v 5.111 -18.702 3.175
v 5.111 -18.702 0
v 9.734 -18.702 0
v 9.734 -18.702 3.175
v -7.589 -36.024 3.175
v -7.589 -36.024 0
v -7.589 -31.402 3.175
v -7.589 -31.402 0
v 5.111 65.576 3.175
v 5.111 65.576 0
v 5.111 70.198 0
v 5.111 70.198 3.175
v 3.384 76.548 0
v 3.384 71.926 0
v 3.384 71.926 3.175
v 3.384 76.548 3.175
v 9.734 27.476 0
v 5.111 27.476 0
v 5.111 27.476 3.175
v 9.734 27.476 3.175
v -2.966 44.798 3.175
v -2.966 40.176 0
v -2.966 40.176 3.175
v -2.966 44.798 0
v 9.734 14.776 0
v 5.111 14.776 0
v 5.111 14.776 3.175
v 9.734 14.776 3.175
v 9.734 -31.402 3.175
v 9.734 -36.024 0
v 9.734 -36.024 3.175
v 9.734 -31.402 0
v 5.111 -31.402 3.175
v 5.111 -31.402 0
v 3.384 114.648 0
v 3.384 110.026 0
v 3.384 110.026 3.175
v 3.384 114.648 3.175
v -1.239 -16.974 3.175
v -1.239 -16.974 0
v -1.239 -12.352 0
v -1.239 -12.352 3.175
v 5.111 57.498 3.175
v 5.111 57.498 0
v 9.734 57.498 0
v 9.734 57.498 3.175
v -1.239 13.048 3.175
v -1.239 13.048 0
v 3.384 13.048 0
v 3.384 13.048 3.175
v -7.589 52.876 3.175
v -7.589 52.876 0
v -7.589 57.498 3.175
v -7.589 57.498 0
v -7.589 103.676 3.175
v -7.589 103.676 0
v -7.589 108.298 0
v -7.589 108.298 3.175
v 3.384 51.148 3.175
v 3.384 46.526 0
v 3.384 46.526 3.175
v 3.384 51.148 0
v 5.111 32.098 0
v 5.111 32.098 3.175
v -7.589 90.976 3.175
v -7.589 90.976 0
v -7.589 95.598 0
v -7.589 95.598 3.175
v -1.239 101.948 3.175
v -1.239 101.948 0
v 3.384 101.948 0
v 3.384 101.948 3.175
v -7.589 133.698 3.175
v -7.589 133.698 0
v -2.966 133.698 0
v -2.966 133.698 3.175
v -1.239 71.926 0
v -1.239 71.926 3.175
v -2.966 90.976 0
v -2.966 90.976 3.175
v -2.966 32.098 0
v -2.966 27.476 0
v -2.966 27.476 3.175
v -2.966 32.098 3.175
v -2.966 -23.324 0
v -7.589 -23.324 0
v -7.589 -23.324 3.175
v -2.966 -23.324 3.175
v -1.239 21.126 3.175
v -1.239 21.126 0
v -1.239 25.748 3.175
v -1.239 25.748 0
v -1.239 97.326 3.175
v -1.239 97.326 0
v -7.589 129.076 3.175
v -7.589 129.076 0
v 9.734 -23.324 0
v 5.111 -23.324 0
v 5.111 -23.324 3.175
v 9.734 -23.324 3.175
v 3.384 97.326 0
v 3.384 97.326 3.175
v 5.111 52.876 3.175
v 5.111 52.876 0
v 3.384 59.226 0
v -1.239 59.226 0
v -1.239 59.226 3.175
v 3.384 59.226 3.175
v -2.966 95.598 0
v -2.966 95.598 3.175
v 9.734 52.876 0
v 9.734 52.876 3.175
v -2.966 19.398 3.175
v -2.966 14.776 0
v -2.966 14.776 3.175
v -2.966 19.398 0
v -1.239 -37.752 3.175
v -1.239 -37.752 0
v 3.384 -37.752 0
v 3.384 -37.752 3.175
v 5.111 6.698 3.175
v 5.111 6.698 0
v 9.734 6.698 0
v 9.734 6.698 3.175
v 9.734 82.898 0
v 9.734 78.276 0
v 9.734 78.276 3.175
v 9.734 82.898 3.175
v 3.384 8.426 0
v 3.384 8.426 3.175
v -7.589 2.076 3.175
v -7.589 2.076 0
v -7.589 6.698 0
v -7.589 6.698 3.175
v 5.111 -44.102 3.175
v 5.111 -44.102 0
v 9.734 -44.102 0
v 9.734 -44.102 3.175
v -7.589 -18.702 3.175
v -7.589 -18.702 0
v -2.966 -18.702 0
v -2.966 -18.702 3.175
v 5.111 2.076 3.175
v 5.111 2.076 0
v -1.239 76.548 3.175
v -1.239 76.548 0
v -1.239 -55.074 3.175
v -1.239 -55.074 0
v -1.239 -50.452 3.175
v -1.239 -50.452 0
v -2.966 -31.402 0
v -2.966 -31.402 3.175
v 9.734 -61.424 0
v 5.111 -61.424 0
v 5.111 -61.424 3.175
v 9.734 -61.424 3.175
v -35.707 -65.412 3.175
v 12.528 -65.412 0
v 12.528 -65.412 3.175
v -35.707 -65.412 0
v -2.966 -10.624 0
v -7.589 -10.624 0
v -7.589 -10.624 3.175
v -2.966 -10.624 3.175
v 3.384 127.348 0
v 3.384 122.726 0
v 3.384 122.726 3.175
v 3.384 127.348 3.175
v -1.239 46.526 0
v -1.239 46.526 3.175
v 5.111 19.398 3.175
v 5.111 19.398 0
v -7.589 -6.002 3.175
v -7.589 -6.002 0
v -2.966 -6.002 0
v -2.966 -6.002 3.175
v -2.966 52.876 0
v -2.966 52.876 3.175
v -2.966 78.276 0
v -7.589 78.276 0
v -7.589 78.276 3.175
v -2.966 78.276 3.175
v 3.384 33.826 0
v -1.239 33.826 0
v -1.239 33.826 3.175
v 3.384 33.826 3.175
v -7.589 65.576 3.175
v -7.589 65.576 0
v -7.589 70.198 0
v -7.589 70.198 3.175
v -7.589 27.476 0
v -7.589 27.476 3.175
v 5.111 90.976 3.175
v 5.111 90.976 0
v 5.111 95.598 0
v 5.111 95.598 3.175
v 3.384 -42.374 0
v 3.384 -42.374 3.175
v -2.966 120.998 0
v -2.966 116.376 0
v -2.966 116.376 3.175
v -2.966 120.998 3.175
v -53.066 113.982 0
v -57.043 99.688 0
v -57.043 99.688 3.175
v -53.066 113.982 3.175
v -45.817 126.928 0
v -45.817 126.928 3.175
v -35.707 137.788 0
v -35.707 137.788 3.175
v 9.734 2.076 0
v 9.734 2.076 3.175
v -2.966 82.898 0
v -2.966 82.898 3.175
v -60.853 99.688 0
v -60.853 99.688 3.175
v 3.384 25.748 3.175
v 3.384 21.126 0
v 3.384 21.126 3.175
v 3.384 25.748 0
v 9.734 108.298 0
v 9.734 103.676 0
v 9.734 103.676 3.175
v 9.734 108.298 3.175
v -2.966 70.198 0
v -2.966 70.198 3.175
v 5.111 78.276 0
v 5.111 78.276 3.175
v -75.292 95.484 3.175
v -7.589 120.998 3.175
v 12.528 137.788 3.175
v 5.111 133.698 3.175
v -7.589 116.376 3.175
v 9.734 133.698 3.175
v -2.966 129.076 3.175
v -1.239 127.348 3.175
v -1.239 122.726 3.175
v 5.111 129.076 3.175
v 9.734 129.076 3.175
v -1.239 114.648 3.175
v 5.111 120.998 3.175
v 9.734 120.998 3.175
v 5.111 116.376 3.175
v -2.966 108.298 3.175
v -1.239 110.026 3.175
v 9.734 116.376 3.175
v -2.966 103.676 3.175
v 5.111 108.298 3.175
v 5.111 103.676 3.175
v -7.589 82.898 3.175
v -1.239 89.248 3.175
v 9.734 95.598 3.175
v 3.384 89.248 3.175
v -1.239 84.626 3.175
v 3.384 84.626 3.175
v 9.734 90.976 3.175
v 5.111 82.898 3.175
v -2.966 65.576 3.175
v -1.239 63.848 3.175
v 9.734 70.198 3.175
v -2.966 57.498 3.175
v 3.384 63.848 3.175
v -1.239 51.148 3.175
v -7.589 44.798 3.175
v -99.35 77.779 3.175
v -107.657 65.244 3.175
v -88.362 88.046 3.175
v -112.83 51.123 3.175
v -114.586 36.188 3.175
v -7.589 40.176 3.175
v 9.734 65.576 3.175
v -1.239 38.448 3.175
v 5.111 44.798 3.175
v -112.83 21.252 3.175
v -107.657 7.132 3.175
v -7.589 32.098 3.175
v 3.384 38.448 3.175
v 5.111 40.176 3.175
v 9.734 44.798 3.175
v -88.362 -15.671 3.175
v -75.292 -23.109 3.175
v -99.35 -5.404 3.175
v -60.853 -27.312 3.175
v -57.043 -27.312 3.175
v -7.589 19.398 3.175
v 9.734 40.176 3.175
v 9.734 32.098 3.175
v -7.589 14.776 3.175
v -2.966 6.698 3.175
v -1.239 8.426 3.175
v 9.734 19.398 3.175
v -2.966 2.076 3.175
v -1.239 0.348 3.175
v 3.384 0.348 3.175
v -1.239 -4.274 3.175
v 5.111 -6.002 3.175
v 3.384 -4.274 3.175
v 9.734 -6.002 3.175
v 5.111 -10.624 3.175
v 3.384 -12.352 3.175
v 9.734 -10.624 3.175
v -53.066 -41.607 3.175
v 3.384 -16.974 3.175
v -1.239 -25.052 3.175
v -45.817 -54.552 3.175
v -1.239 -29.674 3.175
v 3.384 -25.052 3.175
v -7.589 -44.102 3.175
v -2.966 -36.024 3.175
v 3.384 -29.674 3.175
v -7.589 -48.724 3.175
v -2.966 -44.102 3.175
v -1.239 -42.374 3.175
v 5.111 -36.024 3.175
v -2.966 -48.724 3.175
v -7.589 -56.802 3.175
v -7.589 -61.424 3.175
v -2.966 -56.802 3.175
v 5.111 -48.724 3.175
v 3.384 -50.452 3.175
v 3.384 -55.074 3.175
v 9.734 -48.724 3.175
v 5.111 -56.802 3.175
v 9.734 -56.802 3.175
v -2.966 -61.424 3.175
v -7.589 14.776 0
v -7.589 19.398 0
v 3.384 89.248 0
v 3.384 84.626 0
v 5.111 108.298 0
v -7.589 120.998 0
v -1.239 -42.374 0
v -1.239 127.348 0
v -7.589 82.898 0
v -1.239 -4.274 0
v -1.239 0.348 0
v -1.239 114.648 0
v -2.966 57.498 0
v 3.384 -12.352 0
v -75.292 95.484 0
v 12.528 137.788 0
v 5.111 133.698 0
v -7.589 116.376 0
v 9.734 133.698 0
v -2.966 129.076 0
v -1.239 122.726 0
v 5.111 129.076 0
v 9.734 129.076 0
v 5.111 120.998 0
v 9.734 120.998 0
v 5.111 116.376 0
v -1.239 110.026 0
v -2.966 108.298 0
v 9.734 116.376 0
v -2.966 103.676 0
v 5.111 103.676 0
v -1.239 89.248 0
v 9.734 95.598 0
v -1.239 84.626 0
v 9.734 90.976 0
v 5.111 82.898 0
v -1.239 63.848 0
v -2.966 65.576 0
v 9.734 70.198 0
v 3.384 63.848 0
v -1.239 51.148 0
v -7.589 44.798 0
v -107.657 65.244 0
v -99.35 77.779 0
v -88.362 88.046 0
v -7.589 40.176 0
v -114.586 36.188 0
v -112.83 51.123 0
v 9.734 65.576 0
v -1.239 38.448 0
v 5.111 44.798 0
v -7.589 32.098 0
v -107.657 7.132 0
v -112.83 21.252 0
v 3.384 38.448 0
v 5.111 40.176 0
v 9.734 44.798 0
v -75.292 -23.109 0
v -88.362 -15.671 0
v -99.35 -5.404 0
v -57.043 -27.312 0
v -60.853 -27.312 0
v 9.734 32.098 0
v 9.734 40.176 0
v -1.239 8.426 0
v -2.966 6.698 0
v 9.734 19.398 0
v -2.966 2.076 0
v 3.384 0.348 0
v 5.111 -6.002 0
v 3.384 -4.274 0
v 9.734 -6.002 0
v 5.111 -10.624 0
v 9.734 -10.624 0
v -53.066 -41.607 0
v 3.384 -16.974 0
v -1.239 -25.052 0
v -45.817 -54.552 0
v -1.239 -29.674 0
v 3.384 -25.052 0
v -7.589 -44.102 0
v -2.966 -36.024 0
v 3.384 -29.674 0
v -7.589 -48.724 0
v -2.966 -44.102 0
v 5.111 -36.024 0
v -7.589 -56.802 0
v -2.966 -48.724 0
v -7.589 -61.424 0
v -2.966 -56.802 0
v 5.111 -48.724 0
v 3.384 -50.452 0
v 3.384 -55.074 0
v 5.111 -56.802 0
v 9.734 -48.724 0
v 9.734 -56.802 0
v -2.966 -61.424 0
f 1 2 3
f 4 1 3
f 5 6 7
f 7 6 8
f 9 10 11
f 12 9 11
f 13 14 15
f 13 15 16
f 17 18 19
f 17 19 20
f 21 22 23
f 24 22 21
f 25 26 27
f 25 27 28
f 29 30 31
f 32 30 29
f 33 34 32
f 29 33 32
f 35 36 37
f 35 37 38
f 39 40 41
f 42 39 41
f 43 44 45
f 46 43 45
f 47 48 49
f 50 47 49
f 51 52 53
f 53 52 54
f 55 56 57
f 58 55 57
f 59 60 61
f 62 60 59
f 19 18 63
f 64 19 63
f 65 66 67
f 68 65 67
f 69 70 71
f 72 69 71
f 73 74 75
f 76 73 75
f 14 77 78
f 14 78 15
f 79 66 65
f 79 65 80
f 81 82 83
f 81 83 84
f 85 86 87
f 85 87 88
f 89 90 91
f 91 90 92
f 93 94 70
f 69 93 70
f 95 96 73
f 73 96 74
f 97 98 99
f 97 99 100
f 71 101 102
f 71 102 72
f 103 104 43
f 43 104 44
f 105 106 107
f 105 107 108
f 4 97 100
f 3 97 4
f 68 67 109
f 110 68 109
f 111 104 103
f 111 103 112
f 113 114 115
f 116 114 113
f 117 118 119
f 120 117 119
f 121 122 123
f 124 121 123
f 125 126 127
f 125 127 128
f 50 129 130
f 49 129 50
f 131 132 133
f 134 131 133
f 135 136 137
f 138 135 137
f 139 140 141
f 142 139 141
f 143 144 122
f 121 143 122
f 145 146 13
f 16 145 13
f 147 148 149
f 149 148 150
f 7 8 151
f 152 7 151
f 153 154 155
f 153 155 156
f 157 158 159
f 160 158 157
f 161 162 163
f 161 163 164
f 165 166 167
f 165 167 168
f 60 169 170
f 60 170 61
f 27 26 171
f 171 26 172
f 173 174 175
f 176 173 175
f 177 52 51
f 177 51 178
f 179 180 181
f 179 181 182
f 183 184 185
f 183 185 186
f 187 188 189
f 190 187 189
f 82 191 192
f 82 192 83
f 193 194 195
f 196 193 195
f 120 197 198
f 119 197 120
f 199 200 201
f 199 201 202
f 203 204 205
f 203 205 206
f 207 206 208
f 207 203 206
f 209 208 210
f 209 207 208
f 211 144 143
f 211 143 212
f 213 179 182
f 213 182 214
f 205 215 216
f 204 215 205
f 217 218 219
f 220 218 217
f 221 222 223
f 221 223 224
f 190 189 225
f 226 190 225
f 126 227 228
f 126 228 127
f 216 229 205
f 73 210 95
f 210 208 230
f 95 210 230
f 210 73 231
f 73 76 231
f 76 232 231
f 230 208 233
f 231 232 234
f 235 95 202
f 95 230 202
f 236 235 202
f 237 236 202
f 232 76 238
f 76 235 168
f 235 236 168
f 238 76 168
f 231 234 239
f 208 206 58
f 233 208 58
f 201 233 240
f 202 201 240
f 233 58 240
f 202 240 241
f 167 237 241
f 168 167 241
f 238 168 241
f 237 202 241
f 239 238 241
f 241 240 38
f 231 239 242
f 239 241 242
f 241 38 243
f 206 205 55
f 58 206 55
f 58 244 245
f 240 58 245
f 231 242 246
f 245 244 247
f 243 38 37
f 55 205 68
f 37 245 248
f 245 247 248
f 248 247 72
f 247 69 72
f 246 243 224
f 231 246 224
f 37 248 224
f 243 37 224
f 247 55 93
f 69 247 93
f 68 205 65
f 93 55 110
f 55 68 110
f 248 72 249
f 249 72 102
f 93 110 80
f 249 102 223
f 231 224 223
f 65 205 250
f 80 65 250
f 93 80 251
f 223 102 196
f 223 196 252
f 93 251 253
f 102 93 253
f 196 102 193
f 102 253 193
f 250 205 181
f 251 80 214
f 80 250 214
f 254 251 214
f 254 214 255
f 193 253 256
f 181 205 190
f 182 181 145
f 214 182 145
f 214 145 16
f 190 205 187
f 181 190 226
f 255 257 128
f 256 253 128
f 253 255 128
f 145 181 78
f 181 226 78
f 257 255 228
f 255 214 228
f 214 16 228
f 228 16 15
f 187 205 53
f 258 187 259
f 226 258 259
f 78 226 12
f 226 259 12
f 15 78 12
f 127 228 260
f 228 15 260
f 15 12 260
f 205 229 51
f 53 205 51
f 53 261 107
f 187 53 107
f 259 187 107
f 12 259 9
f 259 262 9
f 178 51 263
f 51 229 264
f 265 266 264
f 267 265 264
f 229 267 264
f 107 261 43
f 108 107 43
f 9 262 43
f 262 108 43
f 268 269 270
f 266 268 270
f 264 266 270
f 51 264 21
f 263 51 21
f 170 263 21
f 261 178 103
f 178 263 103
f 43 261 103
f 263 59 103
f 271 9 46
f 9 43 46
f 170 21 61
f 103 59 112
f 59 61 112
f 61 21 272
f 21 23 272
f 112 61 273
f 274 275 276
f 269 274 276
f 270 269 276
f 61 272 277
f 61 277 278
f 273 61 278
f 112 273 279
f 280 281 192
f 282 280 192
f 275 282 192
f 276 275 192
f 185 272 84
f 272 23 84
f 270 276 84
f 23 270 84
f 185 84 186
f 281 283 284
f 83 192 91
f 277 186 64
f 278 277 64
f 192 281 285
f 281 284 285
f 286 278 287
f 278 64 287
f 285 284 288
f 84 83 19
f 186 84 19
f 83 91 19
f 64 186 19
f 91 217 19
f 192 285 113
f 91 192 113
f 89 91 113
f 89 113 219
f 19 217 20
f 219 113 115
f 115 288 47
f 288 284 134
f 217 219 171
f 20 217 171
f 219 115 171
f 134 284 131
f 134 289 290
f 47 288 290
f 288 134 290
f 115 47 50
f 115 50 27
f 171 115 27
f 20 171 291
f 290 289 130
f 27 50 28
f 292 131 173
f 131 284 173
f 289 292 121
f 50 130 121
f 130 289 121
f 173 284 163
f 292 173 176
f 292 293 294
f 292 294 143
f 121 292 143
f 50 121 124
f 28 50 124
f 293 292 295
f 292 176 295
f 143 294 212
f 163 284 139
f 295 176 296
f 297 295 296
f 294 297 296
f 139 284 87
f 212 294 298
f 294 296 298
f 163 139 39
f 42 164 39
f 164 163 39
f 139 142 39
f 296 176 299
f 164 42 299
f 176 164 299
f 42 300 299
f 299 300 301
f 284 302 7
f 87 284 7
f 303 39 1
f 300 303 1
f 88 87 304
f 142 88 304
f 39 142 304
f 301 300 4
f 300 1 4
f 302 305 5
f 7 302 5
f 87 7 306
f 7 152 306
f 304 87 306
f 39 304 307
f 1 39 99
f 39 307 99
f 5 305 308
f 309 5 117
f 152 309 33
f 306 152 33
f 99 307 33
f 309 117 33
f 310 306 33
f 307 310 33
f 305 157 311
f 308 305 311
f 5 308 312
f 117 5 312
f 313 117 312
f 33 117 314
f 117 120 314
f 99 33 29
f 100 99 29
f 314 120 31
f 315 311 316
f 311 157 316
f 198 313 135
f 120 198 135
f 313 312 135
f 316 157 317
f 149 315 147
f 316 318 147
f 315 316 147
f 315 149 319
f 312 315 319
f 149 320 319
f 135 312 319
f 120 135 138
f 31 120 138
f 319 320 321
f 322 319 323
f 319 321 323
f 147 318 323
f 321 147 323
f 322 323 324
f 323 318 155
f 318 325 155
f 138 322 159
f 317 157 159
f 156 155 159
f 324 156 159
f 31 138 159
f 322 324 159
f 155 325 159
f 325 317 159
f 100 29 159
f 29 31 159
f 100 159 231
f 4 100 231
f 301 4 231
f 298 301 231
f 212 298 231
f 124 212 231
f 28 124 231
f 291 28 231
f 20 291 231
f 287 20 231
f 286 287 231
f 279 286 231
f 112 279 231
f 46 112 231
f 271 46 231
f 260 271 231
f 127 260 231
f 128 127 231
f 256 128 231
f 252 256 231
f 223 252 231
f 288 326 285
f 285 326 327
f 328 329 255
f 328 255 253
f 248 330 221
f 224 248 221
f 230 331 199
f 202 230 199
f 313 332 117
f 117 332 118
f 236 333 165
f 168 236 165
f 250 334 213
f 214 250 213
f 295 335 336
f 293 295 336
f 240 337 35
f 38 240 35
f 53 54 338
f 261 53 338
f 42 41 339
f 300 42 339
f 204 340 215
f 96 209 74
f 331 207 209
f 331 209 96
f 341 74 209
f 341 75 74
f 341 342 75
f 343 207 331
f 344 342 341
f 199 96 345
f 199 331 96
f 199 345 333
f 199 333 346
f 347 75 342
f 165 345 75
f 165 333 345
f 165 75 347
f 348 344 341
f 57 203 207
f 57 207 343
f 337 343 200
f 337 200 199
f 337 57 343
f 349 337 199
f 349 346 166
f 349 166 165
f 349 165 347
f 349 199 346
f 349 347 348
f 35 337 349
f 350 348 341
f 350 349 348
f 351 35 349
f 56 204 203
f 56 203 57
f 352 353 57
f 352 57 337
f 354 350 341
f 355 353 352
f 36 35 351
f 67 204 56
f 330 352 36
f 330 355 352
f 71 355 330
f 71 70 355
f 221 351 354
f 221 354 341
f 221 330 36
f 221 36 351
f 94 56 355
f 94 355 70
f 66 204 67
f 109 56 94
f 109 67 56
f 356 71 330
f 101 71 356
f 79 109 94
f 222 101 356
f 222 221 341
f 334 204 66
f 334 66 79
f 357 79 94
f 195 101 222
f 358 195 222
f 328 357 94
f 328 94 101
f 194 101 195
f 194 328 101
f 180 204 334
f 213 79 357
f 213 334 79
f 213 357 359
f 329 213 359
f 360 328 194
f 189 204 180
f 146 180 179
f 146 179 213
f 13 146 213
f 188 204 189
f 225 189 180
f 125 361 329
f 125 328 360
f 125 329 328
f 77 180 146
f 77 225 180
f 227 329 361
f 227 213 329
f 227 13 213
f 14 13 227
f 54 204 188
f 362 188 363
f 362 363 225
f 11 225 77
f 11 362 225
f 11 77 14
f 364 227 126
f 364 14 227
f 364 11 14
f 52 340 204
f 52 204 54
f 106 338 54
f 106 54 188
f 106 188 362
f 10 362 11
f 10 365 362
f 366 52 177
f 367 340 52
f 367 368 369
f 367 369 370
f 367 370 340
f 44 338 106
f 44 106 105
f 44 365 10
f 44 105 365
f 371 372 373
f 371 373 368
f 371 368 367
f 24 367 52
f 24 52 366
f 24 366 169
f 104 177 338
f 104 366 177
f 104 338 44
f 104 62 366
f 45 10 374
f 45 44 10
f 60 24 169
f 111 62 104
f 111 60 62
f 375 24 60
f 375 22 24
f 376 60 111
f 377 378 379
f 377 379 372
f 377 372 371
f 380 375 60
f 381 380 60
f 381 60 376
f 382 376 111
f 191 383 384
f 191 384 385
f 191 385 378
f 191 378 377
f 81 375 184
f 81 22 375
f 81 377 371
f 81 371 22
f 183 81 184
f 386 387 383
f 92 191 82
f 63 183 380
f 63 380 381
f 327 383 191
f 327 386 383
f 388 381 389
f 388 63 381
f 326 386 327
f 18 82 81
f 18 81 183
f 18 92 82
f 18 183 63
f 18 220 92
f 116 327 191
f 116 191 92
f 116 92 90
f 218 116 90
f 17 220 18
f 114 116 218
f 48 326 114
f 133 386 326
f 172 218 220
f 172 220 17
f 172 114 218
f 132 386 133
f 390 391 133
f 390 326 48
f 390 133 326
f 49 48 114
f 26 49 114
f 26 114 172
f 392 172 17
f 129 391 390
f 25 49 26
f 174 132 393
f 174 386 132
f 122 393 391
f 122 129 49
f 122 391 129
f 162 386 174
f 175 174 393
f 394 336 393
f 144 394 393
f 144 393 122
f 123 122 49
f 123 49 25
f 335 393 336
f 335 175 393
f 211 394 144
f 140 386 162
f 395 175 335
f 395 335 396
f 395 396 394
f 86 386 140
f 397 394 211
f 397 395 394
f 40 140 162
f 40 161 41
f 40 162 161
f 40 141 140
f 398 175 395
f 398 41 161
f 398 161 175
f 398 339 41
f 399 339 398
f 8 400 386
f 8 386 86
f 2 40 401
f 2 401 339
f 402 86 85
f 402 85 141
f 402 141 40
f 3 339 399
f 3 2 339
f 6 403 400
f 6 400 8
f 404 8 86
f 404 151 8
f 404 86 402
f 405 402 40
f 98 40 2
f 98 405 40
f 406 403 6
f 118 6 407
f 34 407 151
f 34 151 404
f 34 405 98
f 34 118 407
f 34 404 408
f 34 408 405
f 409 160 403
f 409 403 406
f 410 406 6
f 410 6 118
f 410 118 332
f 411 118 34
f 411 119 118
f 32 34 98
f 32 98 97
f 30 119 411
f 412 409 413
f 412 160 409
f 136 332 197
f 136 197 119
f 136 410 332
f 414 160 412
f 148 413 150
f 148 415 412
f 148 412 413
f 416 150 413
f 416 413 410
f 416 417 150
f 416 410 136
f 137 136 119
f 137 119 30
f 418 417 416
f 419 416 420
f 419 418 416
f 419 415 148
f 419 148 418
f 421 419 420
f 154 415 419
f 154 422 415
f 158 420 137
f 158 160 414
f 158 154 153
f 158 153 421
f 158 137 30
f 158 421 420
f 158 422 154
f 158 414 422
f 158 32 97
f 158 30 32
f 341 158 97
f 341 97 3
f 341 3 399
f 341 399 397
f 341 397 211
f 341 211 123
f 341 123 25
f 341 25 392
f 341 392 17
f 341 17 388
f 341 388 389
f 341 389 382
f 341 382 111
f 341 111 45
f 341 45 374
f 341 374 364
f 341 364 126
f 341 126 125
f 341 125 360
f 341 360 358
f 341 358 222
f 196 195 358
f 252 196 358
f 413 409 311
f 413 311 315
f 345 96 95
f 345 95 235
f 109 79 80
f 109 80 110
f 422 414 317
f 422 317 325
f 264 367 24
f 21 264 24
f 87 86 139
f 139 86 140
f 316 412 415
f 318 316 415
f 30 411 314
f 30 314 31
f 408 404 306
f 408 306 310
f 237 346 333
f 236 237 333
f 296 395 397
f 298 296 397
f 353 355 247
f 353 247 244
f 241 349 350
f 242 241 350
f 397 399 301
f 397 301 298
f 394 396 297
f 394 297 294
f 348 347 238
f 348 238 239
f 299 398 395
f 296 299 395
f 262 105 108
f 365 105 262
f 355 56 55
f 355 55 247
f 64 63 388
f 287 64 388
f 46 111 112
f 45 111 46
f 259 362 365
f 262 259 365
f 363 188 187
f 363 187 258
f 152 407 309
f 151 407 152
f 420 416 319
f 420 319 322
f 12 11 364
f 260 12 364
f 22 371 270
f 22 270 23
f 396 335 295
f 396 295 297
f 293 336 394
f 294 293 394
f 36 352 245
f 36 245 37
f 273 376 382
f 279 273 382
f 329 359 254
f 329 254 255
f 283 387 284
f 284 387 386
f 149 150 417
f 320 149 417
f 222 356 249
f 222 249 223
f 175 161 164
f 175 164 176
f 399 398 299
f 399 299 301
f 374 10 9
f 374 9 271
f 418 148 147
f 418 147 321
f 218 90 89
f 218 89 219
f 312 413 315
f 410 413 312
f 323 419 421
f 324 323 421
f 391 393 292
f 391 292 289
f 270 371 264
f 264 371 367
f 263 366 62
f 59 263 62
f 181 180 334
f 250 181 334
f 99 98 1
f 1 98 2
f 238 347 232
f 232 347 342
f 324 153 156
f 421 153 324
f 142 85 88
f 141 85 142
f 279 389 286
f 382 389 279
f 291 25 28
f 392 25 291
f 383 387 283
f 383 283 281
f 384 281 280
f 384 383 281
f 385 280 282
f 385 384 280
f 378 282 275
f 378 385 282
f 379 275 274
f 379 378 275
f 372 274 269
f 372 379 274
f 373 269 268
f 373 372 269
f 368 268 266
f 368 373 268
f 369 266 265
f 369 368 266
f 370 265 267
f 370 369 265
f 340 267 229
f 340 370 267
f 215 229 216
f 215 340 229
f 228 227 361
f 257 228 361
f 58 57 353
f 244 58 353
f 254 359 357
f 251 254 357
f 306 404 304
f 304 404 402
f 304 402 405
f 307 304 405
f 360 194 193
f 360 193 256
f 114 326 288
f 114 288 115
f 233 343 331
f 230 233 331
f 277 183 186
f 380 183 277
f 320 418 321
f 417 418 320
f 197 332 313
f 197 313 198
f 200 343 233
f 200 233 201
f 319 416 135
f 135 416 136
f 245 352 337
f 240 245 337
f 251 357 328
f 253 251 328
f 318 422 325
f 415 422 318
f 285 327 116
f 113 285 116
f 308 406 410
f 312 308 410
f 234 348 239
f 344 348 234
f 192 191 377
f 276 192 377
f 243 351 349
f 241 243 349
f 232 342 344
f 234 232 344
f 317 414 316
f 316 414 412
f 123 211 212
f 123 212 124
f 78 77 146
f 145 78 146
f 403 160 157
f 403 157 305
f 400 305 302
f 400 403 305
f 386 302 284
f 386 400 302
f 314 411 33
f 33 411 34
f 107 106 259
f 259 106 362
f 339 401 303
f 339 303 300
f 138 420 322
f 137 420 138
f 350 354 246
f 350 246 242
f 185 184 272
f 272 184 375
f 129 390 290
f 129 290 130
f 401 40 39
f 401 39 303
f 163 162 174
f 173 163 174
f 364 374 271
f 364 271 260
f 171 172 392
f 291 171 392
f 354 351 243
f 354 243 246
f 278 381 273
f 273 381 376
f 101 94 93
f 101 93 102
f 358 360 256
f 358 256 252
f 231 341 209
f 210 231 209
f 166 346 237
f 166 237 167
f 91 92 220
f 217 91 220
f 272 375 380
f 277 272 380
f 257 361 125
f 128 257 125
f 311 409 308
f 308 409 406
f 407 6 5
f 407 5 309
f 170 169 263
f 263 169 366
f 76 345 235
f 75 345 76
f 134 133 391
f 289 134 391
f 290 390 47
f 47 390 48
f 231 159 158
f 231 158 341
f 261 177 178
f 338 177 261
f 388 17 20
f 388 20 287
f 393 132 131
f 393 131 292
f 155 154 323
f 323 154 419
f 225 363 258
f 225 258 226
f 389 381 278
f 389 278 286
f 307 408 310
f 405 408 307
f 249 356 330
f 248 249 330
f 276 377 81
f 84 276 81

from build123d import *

# Parameters (mm, degrees)
F0_W      = 24.13
F0_H      = 203.2
F0_W_2    = 4.6228
F0_H_2    = 4.6228
F1_DEPTH  = 3.175
F3_W      = 3.81
F3_H      = 127
F4_DEPTH  = 3.175
F5_W      = 24.13
F5_H      = 203.2
F6_DEPTH  = 3.175
F1_FACE_W = 203.2
F1_FACE_H = 3.175
F9_DEPTH  = 0.0254


with BuildPart() as f1:
    # F0 (on Top) → F1 (new body)
    with BuildSketch(Plane.XY):
        with Locations((0.48795, 36.187809)):
            Rectangle(F0_W, F0_H)
        with Locations((-5.27785, -59.112991)):
            Rectangle(F0_W_2, F0_H_2, mode=Mode.SUBTRACT)
        with Locations((-5.27785, -46.412991)):
            Rectangle(F0_W_2, F0_H_2, mode=Mode.SUBTRACT)
        with Locations((-5.27785, -33.712991)):
            Rectangle(F0_W_2, F0_H_2, mode=Mode.SUBTRACT)
        with Locations((-5.27785, -21.012991)):
            Rectangle(F0_W_2, F0_H_2, mode=Mode.SUBTRACT)
        with Locations((-5.27785, -8.312991)):
            Rectangle(F0_W_2, F0_H_2, mode=Mode.SUBTRACT)
        with Locations((-5.27785, 4.387009)):
            Rectangle(F0_W_2, F0_H_2, mode=Mode.SUBTRACT)
        with Locations((-5.27785, 17.087009)):
            Rectangle(F0_W_2, F0_H_2, mode=Mode.SUBTRACT)
        with Locations((-5.27785, 29.787009)):
            Rectangle(F0_W_2, F0_H_2, mode=Mode.SUBTRACT)
        with Locations((1.07215, -52.762991)):
            Rectangle(F0_W_2, F0_H_2, mode=Mode.SUBTRACT)
        with Locations((1.07215, -40.062991)):
            Rectangle(F0_W_2, F0_H_2, mode=Mode.SUBTRACT)
        with Locations((1.07215, -27.362991)):
            Rectangle(F0_W_2, F0_H_2, mode=Mode.SUBTRACT)
        with Locations((1.07215, -14.662991)):
            Rectangle(F0_W_2, F0_H_2, mode=Mode.SUBTRACT)
        with Locations((7.42215, -59.112991)):
            Rectangle(F0_W_2, F0_H_2, mode=Mode.SUBTRACT)
        with Locations((7.42215, -46.412991)):
            Rectangle(F0_W_2, F0_H_2, mode=Mode.SUBTRACT)
        with Locations((7.42215, -33.712991)):
            Rectangle(F0_W_2, F0_H_2, mode=Mode.SUBTRACT)
        with Locations((7.42215, -21.012991)):
            Rectangle(F0_W_2, F0_H_2, mode=Mode.SUBTRACT)
        with Locations((1.07215, -1.962991)):
            Rectangle(F0_W_2, F0_H_2, mode=Mode.SUBTRACT)
        with Locations((1.07215, 10.737009)):
            Rectangle(F0_W_2, F0_H_2, mode=Mode.SUBTRACT)
        with Locations((1.07215, 23.437009)):
            Rectangle(F0_W_2, F0_H_2, mode=Mode.SUBTRACT)
        with Locations((1.07215, 36.137009)):
            Rectangle(F0_W_2, F0_H_2, mode=Mode.SUBTRACT)
        with Locations((7.42215, -8.312991)):
            Rectangle(F0_W_2, F0_H_2, mode=Mode.SUBTRACT)
        with Locations((7.42215, 4.387009)):
            Rectangle(F0_W_2, F0_H_2, mode=Mode.SUBTRACT)
        with Locations((7.42215, 17.087009)):
            Rectangle(F0_W_2, F0_H_2, mode=Mode.SUBTRACT)
        with Locations((7.42215, 29.787009)):
            Rectangle(F0_W_2, F0_H_2, mode=Mode.SUBTRACT)
        with Locations((-5.27785, 42.487009)):
            Rectangle(F0_W_2, F0_H_2, mode=Mode.SUBTRACT)
        with Locations((-5.27785, 55.187009)):
            Rectangle(F0_W_2, F0_H_2, mode=Mode.SUBTRACT)
        with Locations((-5.27785, 67.887009)):
            Rectangle(F0_W_2, F0_H_2, mode=Mode.SUBTRACT)
        with Locations((-5.27785, 80.587009)):
            Rectangle(F0_W_2, F0_H_2, mode=Mode.SUBTRACT)
        with Locations((-5.27785, 93.287009)):
            Rectangle(F0_W_2, F0_H_2, mode=Mode.SUBTRACT)
        with Locations((-5.27785, 105.987009)):
            Rectangle(F0_W_2, F0_H_2, mode=Mode.SUBTRACT)
        with Locations((-5.27785, 118.687009)):
            Rectangle(F0_W_2, F0_H_2, mode=Mode.SUBTRACT)
        with Locations((-5.27785, 131.387009)):
            Rectangle(F0_W_2, F0_H_2, mode=Mode.SUBTRACT)
        with Locations((1.07215, 48.837009)):
            Rectangle(F0_W_2, F0_H_2, mode=Mode.SUBTRACT)
        with Locations((1.07215, 61.537009)):
            Rectangle(F0_W_2, F0_H_2, mode=Mode.SUBTRACT)
        with Locations((1.07215, 74.237009)):
            Rectangle(F0_W_2, F0_H_2, mode=Mode.SUBTRACT)
        with Locations((1.07215, 86.937009)):
            Rectangle(F0_W_2, F0_H_2, mode=Mode.SUBTRACT)
        with Locations((7.42215, 42.487009)):
            Rectangle(F0_W_2, F0_H_2, mode=Mode.SUBTRACT)
        with Locations((7.42215, 55.187009)):
            Rectangle(F0_W_2, F0_H_2, mode=Mode.SUBTRACT)
        with Locations((7.42215, 67.887009)):
            Rectangle(F0_W_2, F0_H_2, mode=Mode.SUBTRACT)
        with Locations((7.42215, 80.587009)):
            Rectangle(F0_W_2, F0_H_2, mode=Mode.SUBTRACT)
        with Locations((1.07215, 99.637009)):
            Rectangle(F0_W_2, F0_H_2, mode=Mode.SUBTRACT)
        with Locations((1.07215, 112.337009)):
            Rectangle(F0_W_2, F0_H_2, mode=Mode.SUBTRACT)
        with Locations((1.07215, 125.037009)):
            Rectangle(F0_W_2, F0_H_2, mode=Mode.SUBTRACT)
        with Locations((7.42215, 93.287009)):
            Rectangle(F0_W_2, F0_H_2, mode=Mode.SUBTRACT)
        with Locations((7.42215, 105.987009)):
            Rectangle(F0_W_2, F0_H_2, mode=Mode.SUBTRACT)
        with Locations((7.42215, 118.687009)):
            Rectangle(F0_W_2, F0_H_2, mode=Mode.SUBTRACT)
        with Locations((7.42215, 131.387009)):
            Rectangle(F0_W_2, F0_H_2, mode=Mode.SUBTRACT)
    extrude(amount=F1_DEPTH)

    # F2: F1 across face


with BuildPart() as f1_1:
    add(f1.part)
    add(f1.part.mirror(Plane(origin=(-11.57705, 36.187809, 1.5875), x_dir=(0, -1, 0), z_dir=(-1, 0, 0))))

    # F3 (on face) → F4 (join)
    with BuildSketch(Plane(origin=(0, 0, 0), x_dir=(1, 0, 0), z_dir=(0, 0, -1))):
        with BuildLine():
            Line((-35.70705, -137.787809), (-35.70705, 65.412191))
            ThreePointArc((-35.70705, 65.412191), (-49.82872, 48.296246), (-57.04305, 27.312191))
            Line((-57.04305, 27.312191), (-57.04305, -99.687809))
            ThreePointArc((-57.04305, -99.687809), (-49.82872, -120.671864), (-35.70705, -137.787809))
        make_face()
        with Locations((-58.94805, -36.187809)):
            Rectangle(F3_W, F3_H)
        with BuildLine():
            Line((-60.85305, -99.687809), (-60.85305, 27.312191))
            ThreePointArc((-60.85305, 27.312191), (-114.585848, -36.187809), (-60.85305, -99.687809))
        make_face()
    extrude(amount=-F4_DEPTH)

    # F5 (on face) → F6 (join)
    with BuildSketch(Plane.XY.offset(3.175)):
        with Locations((-23.64205, 36.187809)):
            Rectangle(F5_W, F5_H)
    extrude(amount=-F6_DEPTH)

    # F1_face (on face) → F9 (cut)
    with BuildSketch(Plane(origin=(12.55295, 36.187809, 1.5875), x_dir=(0, 1, 0), z_dir=(1, 0, 0))):
        Rectangle(F1_FACE_W, F1_FACE_H)
    extrude(amount=-F9_DEPTH, mode=Mode.SUBTRACT)


solid = f1_1.part
